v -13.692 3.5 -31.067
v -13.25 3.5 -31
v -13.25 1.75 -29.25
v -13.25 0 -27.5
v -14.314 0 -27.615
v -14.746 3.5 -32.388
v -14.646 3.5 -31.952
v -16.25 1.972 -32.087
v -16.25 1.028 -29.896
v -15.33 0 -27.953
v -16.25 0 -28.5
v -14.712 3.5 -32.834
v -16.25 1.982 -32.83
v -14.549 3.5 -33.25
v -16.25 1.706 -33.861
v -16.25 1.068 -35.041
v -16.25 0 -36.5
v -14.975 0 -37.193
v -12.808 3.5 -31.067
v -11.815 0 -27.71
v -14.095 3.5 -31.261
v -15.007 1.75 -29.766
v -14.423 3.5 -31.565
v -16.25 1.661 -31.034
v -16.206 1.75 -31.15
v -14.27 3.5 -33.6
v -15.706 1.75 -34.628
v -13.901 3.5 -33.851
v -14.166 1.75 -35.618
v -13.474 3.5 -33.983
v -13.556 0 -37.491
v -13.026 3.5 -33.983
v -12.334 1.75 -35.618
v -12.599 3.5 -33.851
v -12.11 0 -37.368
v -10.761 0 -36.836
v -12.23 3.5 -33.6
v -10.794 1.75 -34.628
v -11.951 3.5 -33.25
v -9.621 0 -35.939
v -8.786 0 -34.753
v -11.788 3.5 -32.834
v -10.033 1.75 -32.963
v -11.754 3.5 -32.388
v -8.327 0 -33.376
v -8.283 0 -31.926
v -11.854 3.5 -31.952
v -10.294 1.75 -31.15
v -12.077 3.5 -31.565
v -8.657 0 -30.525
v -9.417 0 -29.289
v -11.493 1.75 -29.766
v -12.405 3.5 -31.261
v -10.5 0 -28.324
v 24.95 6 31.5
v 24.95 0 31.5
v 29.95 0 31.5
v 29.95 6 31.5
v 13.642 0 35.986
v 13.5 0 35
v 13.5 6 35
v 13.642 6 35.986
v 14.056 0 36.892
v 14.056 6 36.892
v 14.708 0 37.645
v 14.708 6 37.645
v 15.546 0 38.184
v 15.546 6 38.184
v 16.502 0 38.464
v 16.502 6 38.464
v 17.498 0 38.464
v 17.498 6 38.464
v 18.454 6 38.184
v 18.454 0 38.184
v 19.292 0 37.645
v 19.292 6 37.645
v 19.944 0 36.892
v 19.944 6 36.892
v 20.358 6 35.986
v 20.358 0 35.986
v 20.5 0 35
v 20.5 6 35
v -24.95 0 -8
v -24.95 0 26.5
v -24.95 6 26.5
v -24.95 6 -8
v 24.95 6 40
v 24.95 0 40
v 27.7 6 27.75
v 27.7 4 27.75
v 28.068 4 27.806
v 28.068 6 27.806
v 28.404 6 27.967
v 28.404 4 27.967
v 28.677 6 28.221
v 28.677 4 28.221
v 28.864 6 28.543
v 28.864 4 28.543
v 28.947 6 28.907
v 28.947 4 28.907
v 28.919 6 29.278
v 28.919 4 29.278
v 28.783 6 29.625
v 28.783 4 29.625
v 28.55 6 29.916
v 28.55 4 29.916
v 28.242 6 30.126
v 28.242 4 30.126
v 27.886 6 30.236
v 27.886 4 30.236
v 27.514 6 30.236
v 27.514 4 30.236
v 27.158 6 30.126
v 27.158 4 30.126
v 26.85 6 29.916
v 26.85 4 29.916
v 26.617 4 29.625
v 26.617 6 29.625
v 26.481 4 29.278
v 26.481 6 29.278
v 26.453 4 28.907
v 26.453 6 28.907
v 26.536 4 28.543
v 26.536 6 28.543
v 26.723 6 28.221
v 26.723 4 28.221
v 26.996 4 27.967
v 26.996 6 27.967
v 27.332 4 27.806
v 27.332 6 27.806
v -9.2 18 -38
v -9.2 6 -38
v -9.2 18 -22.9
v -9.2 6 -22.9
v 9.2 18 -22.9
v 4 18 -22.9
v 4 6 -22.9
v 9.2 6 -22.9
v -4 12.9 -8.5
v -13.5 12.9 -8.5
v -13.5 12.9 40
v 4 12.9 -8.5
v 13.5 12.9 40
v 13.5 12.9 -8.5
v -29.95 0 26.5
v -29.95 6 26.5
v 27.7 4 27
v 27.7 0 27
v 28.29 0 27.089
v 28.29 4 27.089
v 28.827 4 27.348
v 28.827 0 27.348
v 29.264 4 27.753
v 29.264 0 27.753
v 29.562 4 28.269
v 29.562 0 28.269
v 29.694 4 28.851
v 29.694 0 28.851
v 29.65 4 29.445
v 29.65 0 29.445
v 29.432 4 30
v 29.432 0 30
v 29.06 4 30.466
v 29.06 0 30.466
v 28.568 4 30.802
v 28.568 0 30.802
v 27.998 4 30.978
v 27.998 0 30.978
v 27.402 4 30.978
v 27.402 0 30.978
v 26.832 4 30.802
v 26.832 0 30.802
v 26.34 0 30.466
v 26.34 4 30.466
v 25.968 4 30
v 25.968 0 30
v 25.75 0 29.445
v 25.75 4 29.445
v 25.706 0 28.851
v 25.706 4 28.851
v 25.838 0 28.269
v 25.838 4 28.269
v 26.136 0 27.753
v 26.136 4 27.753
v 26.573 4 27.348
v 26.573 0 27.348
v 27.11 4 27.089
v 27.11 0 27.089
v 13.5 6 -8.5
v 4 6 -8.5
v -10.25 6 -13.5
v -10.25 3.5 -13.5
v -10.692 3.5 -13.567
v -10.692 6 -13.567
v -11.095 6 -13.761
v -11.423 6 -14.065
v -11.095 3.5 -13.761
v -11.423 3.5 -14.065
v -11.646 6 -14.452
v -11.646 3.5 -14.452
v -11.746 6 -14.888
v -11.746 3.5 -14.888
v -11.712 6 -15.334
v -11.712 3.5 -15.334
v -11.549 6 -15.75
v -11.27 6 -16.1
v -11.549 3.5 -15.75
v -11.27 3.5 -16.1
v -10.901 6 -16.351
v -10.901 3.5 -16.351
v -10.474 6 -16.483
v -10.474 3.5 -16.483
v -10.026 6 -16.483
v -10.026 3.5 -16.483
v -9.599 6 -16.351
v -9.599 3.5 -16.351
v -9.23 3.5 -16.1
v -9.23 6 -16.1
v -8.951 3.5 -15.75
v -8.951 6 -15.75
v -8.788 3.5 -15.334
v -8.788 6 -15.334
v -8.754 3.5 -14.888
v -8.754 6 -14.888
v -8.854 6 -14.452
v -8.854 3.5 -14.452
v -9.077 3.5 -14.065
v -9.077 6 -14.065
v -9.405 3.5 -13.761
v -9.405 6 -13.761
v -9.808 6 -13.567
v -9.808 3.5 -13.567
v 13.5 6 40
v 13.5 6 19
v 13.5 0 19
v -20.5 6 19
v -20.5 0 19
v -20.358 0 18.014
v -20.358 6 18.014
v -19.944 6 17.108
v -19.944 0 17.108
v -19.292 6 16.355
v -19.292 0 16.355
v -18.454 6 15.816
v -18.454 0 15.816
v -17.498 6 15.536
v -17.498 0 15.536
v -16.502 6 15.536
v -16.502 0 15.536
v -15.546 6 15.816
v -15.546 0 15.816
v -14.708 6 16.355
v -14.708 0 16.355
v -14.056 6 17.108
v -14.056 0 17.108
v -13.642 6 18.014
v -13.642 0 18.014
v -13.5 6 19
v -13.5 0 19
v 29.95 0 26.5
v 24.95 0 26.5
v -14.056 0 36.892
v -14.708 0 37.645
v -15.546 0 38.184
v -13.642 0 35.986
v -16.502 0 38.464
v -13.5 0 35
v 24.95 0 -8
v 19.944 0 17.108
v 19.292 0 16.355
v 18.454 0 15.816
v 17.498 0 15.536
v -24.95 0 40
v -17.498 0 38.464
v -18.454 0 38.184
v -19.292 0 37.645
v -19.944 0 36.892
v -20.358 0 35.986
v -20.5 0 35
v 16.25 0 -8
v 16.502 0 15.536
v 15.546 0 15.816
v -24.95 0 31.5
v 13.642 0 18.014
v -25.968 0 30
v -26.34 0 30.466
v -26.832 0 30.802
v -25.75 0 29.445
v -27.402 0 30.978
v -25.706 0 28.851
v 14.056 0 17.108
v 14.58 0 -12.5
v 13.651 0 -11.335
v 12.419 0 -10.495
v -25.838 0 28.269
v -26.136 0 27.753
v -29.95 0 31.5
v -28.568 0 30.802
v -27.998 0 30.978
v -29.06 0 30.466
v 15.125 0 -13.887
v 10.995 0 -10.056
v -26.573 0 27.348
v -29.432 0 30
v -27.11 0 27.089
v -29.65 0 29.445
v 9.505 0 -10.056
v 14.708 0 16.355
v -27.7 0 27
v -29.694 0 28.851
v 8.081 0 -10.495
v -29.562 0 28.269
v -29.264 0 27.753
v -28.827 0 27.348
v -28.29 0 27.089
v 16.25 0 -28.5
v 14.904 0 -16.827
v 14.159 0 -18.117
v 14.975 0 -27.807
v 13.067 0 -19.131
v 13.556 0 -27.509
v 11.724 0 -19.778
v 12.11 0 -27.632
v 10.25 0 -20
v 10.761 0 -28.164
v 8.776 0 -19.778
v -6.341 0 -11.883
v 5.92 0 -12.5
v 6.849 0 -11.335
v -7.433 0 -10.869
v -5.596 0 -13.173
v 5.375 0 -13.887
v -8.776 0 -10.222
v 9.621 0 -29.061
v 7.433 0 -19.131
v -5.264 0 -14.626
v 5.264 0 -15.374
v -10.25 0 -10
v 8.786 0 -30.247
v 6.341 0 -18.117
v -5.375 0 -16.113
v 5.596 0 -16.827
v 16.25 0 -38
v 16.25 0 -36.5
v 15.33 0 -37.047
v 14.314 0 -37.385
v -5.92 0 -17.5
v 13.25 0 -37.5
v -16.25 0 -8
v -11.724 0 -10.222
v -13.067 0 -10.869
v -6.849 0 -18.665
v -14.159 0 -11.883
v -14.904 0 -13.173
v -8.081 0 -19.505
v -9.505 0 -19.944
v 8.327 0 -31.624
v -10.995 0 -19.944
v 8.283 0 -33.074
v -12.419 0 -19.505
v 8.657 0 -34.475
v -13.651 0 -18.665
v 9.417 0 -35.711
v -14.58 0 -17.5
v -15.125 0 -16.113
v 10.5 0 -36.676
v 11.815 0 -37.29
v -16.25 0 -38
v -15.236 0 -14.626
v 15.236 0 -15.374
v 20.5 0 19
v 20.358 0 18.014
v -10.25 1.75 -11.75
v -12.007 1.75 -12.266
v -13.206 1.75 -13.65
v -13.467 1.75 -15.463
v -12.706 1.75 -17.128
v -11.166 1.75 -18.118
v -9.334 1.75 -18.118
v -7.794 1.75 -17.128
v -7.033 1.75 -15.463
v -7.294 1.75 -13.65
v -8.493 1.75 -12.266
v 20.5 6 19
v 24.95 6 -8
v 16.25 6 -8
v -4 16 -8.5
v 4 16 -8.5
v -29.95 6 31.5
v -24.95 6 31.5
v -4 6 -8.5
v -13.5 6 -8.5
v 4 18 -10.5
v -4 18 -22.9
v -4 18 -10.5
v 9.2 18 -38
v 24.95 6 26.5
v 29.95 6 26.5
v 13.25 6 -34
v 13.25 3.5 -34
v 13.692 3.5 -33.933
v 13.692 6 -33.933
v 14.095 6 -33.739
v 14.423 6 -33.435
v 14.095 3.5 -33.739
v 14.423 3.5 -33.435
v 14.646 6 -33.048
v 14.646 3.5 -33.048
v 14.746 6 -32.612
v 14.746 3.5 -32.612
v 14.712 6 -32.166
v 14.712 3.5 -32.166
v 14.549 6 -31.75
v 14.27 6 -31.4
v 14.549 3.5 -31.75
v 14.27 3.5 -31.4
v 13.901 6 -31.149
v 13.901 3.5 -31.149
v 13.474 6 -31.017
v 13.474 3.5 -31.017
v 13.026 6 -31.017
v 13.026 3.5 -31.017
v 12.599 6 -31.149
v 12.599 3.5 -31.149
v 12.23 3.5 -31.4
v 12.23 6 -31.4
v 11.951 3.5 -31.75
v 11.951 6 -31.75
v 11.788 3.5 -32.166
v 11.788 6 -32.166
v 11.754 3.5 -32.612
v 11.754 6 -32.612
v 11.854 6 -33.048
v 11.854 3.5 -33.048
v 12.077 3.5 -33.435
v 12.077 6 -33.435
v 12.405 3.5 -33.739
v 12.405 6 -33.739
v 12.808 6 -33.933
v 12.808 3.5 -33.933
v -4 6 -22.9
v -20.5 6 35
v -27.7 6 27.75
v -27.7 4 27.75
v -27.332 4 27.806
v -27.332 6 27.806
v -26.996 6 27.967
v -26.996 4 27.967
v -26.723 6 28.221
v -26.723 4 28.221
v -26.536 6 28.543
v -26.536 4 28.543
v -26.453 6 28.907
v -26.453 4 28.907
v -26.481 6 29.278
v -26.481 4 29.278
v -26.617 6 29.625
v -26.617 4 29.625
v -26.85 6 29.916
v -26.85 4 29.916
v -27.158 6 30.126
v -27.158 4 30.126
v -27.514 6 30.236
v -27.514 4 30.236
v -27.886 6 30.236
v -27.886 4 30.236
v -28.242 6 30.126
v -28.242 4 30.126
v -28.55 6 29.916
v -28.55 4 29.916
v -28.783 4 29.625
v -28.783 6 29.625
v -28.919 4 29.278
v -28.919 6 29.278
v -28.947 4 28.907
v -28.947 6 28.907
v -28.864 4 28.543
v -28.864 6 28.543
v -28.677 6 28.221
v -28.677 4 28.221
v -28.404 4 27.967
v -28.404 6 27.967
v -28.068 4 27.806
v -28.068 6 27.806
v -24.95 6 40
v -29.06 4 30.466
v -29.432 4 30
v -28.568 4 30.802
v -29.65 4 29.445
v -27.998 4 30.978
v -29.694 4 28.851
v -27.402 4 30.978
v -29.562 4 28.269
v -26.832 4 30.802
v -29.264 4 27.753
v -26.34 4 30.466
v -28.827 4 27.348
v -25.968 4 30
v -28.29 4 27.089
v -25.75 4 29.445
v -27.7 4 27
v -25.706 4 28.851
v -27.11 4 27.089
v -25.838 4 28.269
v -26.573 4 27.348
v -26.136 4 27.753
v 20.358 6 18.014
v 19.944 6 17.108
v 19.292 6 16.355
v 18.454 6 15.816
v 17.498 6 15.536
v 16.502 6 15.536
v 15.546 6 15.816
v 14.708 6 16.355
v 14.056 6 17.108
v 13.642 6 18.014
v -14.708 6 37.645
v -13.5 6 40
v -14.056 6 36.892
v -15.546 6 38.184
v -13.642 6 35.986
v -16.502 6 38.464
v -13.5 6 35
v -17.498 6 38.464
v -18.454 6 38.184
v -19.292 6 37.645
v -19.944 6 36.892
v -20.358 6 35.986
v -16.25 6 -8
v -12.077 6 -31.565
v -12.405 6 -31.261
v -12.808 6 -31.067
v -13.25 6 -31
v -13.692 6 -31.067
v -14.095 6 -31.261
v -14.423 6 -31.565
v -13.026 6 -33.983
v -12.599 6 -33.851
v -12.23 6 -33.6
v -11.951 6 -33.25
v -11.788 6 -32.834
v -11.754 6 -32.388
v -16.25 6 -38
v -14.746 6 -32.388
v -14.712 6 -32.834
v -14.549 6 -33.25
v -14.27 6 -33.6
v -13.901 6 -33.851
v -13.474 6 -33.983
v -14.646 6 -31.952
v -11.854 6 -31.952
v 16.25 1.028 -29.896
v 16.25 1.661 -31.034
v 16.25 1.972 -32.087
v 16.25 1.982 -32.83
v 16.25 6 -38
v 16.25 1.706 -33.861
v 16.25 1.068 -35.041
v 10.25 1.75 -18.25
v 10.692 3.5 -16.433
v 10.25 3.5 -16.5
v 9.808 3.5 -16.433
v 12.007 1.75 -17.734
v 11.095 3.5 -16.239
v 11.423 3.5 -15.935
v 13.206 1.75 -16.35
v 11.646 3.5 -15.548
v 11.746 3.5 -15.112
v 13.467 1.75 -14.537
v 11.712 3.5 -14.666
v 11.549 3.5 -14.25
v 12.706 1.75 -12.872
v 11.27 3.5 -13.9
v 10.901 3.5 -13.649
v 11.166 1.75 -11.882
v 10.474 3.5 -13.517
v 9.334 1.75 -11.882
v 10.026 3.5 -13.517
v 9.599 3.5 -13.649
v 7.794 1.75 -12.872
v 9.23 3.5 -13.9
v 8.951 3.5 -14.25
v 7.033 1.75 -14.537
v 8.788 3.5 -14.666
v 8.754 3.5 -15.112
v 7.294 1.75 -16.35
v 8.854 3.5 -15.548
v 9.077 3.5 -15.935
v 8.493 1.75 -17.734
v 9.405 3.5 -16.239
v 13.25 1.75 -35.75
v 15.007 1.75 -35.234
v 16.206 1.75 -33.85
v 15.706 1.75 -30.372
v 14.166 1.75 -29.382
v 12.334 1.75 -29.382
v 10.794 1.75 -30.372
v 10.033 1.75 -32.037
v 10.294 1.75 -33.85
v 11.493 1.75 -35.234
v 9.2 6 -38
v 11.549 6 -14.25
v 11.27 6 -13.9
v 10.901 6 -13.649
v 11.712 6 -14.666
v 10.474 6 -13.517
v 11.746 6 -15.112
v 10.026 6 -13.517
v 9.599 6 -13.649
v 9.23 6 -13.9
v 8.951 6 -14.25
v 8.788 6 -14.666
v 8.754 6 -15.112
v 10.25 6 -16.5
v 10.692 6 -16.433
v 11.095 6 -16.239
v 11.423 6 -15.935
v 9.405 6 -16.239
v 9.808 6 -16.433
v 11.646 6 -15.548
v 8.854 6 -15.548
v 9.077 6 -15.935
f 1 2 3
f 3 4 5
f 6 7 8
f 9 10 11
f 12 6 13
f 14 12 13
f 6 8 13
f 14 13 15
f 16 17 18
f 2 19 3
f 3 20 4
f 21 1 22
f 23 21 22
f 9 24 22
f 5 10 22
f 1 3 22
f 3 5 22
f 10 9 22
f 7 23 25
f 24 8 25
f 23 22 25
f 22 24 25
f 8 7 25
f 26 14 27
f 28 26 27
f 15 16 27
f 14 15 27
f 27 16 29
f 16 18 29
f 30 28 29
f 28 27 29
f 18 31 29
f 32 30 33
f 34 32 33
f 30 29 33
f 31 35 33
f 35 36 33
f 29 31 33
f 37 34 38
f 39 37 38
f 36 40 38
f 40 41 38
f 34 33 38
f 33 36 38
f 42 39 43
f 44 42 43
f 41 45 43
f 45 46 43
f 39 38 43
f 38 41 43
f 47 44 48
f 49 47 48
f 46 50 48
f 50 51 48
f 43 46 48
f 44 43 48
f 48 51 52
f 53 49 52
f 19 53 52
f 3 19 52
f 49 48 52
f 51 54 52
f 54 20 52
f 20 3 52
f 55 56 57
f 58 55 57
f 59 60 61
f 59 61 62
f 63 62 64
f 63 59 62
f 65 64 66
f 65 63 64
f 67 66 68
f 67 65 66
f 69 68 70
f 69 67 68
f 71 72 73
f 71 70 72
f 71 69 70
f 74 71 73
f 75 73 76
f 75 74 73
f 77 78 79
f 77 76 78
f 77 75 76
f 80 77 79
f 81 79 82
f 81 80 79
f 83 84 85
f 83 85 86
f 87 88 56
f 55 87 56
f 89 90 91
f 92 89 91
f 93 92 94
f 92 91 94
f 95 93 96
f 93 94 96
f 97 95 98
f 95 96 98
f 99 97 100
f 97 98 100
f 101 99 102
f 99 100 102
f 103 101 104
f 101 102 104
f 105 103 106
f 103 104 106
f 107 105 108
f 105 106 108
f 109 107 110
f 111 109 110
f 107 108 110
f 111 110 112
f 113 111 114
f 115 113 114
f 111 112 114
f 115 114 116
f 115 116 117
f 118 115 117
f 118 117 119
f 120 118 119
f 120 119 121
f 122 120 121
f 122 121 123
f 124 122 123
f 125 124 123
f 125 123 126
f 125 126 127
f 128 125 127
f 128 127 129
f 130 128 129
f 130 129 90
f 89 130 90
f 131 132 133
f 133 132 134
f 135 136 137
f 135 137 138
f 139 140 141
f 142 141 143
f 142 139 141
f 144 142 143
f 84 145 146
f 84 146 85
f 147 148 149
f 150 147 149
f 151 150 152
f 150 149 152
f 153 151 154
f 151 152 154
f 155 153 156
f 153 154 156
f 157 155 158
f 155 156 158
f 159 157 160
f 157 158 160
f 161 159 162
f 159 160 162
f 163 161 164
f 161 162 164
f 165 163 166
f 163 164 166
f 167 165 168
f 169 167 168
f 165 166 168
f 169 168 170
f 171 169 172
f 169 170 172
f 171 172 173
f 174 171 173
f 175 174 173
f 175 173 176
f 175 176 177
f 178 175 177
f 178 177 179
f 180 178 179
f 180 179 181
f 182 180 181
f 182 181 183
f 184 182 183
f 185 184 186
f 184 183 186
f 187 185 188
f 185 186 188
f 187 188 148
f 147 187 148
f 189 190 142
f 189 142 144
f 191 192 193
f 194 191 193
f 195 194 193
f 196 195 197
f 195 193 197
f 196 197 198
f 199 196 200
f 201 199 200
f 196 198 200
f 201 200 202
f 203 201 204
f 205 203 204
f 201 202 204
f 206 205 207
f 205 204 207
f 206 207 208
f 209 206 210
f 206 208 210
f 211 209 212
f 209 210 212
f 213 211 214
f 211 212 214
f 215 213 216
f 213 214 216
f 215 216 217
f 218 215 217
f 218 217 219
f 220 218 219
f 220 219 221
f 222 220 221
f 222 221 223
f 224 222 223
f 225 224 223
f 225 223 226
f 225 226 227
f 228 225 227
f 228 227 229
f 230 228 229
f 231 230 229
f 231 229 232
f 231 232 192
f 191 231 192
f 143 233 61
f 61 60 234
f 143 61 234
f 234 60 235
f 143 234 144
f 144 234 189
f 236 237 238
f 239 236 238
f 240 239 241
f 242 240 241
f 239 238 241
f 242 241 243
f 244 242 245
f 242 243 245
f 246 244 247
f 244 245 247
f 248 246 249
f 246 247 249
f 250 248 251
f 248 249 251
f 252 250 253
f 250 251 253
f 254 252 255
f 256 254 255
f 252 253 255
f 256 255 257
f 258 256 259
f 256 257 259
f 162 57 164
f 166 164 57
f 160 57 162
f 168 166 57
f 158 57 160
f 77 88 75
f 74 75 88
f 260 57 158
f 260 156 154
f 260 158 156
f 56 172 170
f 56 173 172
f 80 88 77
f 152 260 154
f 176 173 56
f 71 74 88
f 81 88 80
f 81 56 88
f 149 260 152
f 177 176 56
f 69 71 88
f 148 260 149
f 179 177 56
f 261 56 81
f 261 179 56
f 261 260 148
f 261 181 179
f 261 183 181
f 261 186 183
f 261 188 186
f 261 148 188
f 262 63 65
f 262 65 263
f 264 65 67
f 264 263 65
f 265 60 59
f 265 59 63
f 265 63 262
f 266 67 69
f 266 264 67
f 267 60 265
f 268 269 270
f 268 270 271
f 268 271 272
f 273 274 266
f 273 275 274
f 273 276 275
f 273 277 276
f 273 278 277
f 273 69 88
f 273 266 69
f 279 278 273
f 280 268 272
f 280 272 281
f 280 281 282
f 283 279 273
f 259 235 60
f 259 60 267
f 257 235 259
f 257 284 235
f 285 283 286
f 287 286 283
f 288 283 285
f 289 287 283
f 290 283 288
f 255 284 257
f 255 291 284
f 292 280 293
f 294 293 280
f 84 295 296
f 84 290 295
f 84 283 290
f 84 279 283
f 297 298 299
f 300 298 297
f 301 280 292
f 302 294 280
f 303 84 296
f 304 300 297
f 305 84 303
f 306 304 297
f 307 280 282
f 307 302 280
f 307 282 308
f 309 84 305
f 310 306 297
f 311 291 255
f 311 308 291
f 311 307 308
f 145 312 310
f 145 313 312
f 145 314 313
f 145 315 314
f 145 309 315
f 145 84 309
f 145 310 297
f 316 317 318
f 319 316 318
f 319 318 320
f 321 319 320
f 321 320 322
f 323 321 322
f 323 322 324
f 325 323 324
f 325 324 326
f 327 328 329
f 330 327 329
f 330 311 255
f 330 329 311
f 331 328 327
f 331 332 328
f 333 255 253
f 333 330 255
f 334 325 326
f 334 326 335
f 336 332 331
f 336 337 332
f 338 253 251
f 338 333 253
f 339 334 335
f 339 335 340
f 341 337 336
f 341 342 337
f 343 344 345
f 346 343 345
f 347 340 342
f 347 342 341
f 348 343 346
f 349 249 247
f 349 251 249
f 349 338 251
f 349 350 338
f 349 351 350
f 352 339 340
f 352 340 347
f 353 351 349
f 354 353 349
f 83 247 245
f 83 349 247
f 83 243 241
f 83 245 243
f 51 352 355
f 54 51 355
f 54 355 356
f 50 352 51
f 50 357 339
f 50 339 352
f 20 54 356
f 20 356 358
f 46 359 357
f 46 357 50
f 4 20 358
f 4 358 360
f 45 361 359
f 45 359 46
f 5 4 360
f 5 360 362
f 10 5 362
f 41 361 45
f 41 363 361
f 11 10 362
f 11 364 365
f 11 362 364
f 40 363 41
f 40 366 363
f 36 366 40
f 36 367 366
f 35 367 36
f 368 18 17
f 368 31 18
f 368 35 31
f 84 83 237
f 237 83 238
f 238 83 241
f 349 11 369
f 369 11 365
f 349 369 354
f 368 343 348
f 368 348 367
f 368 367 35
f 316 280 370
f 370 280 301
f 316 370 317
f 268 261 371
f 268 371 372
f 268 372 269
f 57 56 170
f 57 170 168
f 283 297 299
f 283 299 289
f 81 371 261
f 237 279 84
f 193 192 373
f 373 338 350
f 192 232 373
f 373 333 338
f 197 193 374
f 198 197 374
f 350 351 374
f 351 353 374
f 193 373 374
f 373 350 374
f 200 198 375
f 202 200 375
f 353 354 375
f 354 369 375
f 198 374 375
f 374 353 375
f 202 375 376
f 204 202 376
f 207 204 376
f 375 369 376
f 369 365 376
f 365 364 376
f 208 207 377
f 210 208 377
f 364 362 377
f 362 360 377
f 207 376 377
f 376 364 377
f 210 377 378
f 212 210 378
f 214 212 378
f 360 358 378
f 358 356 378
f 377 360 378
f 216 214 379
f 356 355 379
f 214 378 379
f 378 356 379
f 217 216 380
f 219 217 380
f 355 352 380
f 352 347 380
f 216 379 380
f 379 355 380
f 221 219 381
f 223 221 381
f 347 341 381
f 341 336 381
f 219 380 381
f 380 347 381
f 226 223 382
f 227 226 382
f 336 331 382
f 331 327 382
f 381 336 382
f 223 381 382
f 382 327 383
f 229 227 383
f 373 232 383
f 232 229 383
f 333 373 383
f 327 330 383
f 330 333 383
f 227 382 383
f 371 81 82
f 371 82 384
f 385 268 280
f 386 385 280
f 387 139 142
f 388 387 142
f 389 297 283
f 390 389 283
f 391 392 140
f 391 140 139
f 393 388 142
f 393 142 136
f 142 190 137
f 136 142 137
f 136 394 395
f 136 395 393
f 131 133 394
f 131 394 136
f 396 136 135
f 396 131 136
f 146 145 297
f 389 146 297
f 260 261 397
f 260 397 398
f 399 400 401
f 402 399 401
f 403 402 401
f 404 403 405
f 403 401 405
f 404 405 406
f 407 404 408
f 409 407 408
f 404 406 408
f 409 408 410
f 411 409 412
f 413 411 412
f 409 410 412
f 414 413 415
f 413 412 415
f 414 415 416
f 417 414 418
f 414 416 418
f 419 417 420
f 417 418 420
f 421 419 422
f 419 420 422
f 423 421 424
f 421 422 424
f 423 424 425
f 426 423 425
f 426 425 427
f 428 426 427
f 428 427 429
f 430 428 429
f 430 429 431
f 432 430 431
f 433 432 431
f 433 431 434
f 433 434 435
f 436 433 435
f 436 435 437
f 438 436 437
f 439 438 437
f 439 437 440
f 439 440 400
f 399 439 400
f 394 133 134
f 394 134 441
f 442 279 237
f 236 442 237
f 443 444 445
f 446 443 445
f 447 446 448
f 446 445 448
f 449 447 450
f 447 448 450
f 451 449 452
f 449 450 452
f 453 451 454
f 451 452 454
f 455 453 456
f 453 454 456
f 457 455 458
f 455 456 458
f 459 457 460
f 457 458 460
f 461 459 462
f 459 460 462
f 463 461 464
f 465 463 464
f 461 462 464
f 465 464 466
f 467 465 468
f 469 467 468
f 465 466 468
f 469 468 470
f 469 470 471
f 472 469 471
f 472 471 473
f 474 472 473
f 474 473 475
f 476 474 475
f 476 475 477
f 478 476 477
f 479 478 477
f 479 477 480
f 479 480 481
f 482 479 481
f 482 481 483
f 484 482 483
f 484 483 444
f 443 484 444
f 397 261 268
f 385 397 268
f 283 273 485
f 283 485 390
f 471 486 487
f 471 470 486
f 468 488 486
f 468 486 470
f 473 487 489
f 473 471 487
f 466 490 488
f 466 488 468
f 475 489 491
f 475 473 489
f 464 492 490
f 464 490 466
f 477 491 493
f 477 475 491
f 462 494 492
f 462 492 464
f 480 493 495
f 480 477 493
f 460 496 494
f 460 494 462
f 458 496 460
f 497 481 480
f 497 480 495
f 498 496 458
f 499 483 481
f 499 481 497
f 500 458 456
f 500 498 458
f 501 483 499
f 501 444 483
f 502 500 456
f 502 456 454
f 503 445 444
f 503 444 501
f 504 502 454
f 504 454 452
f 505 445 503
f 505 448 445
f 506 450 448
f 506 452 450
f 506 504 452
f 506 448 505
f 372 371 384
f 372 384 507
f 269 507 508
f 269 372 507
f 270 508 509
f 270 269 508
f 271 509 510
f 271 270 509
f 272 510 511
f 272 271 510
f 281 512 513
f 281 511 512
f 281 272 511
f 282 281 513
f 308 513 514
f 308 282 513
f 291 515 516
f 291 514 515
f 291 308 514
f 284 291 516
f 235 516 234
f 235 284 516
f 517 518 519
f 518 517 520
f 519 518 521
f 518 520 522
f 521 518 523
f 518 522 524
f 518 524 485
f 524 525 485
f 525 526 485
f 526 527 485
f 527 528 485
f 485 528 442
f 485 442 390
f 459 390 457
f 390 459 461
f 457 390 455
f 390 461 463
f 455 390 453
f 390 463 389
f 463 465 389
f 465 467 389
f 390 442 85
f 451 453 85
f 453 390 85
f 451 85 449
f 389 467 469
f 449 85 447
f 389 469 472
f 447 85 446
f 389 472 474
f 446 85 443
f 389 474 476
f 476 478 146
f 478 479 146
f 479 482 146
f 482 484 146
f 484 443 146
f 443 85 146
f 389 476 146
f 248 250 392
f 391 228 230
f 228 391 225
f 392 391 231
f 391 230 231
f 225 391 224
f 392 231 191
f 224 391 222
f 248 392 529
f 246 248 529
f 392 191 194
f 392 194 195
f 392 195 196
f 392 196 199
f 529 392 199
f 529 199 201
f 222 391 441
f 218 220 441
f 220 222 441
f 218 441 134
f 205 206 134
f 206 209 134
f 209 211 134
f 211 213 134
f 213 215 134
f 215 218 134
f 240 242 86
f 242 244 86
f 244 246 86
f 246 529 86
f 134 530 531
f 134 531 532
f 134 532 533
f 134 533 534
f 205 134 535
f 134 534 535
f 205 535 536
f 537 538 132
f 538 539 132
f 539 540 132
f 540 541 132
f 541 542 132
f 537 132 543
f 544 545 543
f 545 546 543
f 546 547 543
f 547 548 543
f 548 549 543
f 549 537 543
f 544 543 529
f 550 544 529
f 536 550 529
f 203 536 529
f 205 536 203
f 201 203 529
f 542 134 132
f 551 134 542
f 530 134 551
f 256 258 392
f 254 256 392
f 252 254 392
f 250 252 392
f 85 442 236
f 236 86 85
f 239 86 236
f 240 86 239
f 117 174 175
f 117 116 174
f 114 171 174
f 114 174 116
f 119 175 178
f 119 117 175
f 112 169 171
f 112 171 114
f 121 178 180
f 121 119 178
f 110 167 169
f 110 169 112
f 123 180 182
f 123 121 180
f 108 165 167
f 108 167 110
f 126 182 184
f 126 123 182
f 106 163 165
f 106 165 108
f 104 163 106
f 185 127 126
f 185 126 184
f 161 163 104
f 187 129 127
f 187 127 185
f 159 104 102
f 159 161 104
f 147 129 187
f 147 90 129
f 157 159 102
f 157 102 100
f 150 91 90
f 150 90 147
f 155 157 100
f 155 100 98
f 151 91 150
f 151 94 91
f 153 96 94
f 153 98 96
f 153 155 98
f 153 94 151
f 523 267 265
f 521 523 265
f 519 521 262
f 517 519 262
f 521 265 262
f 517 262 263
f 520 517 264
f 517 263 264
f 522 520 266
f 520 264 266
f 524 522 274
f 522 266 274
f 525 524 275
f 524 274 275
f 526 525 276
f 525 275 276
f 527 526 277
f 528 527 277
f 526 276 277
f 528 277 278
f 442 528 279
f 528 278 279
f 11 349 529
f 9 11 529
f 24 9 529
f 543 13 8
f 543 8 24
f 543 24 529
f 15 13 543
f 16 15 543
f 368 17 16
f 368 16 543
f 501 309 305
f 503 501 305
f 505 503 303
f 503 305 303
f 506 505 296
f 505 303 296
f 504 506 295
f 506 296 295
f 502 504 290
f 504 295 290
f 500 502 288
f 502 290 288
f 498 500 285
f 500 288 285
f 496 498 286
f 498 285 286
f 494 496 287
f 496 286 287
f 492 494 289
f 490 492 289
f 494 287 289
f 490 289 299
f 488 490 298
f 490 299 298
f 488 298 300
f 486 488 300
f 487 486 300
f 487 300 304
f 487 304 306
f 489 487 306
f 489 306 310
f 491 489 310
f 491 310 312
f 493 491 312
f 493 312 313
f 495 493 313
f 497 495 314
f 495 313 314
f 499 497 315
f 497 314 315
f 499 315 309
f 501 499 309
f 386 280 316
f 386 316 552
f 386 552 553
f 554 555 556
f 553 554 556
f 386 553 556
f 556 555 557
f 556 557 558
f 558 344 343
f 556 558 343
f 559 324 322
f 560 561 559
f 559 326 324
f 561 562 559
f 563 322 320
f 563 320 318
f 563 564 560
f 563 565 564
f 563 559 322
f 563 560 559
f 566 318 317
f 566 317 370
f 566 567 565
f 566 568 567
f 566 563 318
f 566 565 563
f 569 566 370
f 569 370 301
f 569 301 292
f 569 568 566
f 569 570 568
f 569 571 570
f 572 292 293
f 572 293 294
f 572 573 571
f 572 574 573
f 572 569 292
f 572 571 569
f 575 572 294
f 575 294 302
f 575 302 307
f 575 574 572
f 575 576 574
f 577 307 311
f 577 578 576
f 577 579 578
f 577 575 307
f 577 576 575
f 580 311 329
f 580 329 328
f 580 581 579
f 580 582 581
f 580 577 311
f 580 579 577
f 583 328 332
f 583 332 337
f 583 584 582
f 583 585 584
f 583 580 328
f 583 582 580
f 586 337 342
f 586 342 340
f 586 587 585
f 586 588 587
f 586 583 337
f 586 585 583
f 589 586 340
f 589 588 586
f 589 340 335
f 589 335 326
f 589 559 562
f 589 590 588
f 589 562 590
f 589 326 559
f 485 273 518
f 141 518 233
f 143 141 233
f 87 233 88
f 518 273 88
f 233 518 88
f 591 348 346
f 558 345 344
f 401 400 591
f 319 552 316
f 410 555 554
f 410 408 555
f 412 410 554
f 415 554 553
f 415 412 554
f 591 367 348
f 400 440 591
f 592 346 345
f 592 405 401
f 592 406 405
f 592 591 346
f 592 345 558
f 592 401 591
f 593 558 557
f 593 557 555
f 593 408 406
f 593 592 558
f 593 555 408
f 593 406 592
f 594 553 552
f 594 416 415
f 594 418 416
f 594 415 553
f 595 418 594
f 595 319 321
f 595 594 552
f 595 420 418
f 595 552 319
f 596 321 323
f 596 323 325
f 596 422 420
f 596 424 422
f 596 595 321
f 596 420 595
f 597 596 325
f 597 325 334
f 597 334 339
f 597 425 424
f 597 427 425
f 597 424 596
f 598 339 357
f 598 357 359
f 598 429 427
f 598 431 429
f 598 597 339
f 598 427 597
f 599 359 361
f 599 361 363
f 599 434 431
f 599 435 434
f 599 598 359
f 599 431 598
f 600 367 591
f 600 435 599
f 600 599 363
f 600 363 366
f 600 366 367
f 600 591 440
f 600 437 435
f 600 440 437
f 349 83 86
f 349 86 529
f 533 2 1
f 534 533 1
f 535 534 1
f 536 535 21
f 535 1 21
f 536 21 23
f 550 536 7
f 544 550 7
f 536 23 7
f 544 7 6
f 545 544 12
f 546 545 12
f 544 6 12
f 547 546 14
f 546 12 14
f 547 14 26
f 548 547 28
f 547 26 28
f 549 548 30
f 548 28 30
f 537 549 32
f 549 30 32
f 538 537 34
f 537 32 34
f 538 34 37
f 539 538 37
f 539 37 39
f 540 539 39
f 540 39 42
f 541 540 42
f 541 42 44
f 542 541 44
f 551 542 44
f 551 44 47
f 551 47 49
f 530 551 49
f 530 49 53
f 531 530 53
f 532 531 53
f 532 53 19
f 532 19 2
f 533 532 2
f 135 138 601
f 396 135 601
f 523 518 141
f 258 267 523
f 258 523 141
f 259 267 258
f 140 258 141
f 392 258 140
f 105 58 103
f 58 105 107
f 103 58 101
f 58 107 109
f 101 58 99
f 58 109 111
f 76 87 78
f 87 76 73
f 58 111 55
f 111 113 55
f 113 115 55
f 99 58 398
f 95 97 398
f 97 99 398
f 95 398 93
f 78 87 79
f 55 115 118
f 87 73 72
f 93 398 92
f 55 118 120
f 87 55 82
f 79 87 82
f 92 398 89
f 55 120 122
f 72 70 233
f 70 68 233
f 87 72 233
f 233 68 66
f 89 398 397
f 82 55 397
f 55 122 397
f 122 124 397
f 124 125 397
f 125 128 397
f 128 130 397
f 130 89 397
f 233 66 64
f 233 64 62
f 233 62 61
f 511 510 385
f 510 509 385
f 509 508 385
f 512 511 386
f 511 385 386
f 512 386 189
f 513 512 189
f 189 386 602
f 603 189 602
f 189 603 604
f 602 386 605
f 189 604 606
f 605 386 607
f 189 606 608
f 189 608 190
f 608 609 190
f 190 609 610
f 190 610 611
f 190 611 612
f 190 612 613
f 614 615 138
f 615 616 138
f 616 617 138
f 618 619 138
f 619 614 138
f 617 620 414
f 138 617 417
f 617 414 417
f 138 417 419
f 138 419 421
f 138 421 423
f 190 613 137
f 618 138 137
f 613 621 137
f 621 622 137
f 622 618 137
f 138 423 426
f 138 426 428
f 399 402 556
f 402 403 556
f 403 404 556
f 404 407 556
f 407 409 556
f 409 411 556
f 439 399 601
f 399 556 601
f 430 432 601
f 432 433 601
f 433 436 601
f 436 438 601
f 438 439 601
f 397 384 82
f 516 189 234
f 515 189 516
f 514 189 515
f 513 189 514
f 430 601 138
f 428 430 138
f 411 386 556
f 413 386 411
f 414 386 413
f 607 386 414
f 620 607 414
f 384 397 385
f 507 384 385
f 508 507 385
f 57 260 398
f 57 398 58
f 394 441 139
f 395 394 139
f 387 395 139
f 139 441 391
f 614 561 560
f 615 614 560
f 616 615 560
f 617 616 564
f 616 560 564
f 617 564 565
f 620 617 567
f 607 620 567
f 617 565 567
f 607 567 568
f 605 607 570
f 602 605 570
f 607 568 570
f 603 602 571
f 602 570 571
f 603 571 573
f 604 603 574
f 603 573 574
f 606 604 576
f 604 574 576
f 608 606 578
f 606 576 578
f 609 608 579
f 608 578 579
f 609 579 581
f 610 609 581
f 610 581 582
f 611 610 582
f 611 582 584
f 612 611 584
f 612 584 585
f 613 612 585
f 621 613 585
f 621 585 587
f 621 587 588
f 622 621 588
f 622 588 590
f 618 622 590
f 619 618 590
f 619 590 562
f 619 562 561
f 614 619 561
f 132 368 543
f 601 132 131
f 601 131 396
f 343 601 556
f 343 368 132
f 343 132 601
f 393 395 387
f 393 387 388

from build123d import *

# Parameters (mm, degrees)
EXTRUDE_1_DEPTH     = 6
EXTRUDE_2_DEPTH     = 12
CUT_EXTRUDE_1_REACH = 52.712
SKETCH_3_R          = 1.5
CHAMFER_1_SIZE      = 2
SKETCH_4_W          = 27
SKETCH_4_H          = 48.5
EXTRUDE_3_DEPTH     = 6.9
SKETCH_5_W          = 32.5
SKETCH_5_H          = 0.5
CUT_EXTRUDE_2_DEPTH = 51.711956184
SKETCH_6_W          = 5
SKETCH_6_H          = 5
EXTRUDE_4_DEPTH     = 6
SKETCH_9_R          = 1.25
CUT_EXTRUDE_5_DEPTH = 54.113110434
SKETCH_10_R         = 2
CUT_EXTRUDE_6_DEPTH = 4
CHAMFER_3_SIZE      = 3.5


with BuildPart() as part:
    # 草图1 → 凸台-拉伸1 (new body)
    with BuildSketch(Plane(origin=(0, 0, 0), x_dir=(1, 0, 0), z_dir=(0, 1, 0))):
        Polygon((-25.45, -32), (-25.45, -28), (-25.45, -3.5), (-25.45, 0.5), (-25.45, 8.5), (-16.25, 8.5), (-16.25, 38.5), (16.25, 38.5), (16.25, 8.5), (25.45, 8.5), (25.45, 0.5), (25.45, -3.5), (25.45, -28), (25.45, -32), (25.45, -40), (-25.45, -40), align=None)
    extrude(amount=EXTRUDE_1_DEPTH)

    # 草图2 → 凸台-拉伸2 (add)
    with BuildSketch(Plane(origin=(0, 6, 0), x_dir=(1, 0, 0), z_dir=(0, 1, 0))):
        Polygon((-4, 22.9), (-4, 8.5), (4, 8.5), (4, 22.9), (9.2, 22.9), (9.2, 38.5), (-9.2, 38.5), (-9.2, 22.9), align=None)
    extrude(amount=EXTRUDE_2_DEPTH)

    # 草图3 → 切除-拉伸1 (cut, up to next)
    with BuildSketch(Plane.XZ, mode=Mode.PRIVATE) as cut_extrude_1_sk1:
        with Locations(Location((13.25, -32.5, 0), (0, 0, 270))):
            Circle(SKETCH_3_R)
    cut_extrude_1_tool1 = extrude(cut_extrude_1_sk1.sketch, amount=-CUT_EXTRUDE_1_REACH, mode=Mode.PRIVATE) & part.part
    # 草图3 → 切除-拉伸1 (cut, up to next)
    with BuildSketch(Plane.XZ, mode=Mode.PRIVATE) as cut_extrude_1_sk2:
        with Locations(Location((10.25, -15, 0), (0, 0, 270))):
            Circle(SKETCH_3_R)
    cut_extrude_1_tool2 = extrude(cut_extrude_1_sk2.sketch, amount=-CUT_EXTRUDE_1_REACH, mode=Mode.PRIVATE) & part.part
    # 草图3 → 切除-拉伸1 (cut, up to next)
    with BuildSketch(Plane.XZ, mode=Mode.PRIVATE) as cut_extrude_1_sk3:
        with Locations(Location((-13.25, -32.5, 0), (0, 0, 90))):
            Circle(SKETCH_3_R)
    cut_extrude_1_tool3 = extrude(cut_extrude_1_sk3.sketch, amount=-CUT_EXTRUDE_1_REACH, mode=Mode.PRIVATE) & part.part
    # 草图3 → 切除-拉伸1 (cut, up to next)
    with BuildSketch(Plane.XZ, mode=Mode.PRIVATE) as cut_extrude_1_sk4:
        with Locations(Location((-10.25, -15, 0), (0, 0, 90))):
            Circle(SKETCH_3_R)
    cut_extrude_1_tool4 = extrude(cut_extrude_1_sk4.sketch, amount=-CUT_EXTRUDE_1_REACH, mode=Mode.PRIVATE) & part.part
    # 草图3 → 切除-拉伸1 (cut, up to next)
    with BuildSketch(Plane.XZ, mode=Mode.PRIVATE) as cut_extrude_1_sk5:
        with BuildLine():
            Line((13.5, 19), (13.5, 35))
            ThreePointArc((13.5, 35), (17, 38.5), (20.5, 35))
            Line((20.5, 35), (20.5, 19))
            ThreePointArc((20.5, 19), (17, 15.5), (13.5, 19))
        make_face()
    cut_extrude_1_tool5 = extrude(cut_extrude_1_sk5.sketch, amount=-CUT_EXTRUDE_1_REACH, mode=Mode.PRIVATE) & part.part
    # 草图3 → 切除-拉伸1 (cut, up to next)
    with BuildSketch(Plane.XZ, mode=Mode.PRIVATE) as cut_extrude_1_sk6:
        with BuildLine():
            Line((-13.5, 19), (-13.5, 35))
            ThreePointArc((-13.5, 35), (-17, 38.5), (-20.5, 35))
            Line((-20.5, 35), (-20.5, 19))
            ThreePointArc((-20.5, 19), (-17, 15.5), (-13.5, 19))
        make_face()
    cut_extrude_1_tool6 = extrude(cut_extrude_1_sk6.sketch, amount=-CUT_EXTRUDE_1_REACH, mode=Mode.PRIVATE) & part.part
    add(cut_extrude_1_tool1.solids().sort_by_distance((13.25, 0, -32.5))[0], mode=Mode.SUBTRACT)
    add(cut_extrude_1_tool2.solids().sort_by_distance((10.25, 0, -15))[0], mode=Mode.SUBTRACT)
    add(cut_extrude_1_tool3.solids().sort_by_distance((-13.25, 0, -32.5))[0], mode=Mode.SUBTRACT)
    add(cut_extrude_1_tool4.solids().sort_by_distance((-10.25, 0, -15))[0], mode=Mode.SUBTRACT)
    add(cut_extrude_1_tool5.solids().sort_by_distance((17, 0, 27))[0], mode=Mode.SUBTRACT)
    add(cut_extrude_1_tool6.solids().sort_by_distance((-17, 0, 27))[0], mode=Mode.SUBTRACT)

    # 倒角1
    chamfer_1_edges = [part.edges().sort_by_distance(p)[0] for p in [
        (0, 18, -8.5),
    ]]
    chamfer(chamfer_1_edges, length=CHAMFER_1_SIZE)

    # 草图4 → 凸台-拉伸3 (add)
    with BuildSketch(Plane(origin=(0, 6, 0), x_dir=(1, 0, 0), z_dir=(0, 1, 0))):
        with Locations((0, -15.75)):
            Rectangle(SKETCH_4_W, SKETCH_4_H)
    extrude(amount=EXTRUDE_3_DEPTH)

    # 草图5 → 切除-拉伸2 (cut, through all)
    with BuildSketch(Plane.XZ):
        Polygon((24.95, 40), (24.95, -8), (16.25, -8), (16.25, -8.5), (25.45, -8.5), (25.45, 40), align=None)
        Polygon((-16.25, -8.5), (-25.45, -8.5), (-25.45, 40), (-24.95, 40), (-24.95, -8), (-16.25, -8), align=None)
        with Locations((0, -38.25)):
            Rectangle(SKETCH_5_W, SKETCH_5_H)
    extrude(amount=-CUT_EXTRUDE_2_DEPTH, mode=Mode.SUBTRACT)

    # 草图6 → 凸台-拉伸4 (add)
    with BuildSketch(Plane.XZ):
        with Locations((-27.45, 29)):
            Rectangle(SKETCH_6_W, SKETCH_6_H)
        with Locations((27.45, 29)):
            Rectangle(SKETCH_6_W, SKETCH_6_H)
    extrude(amount=-EXTRUDE_4_DEPTH)

    # 草图9 → 切除-拉伸5 (cut, through all)
    with BuildSketch(Plane.XZ):
        with Locations(Location((-27.7, 29, 0), (0, 0, 270))):
            Circle(SKETCH_9_R)
        with Locations(Location((27.7, 29, 0), (0, 0, 270))):
            Circle(SKETCH_9_R)
    extrude(amount=-CUT_EXTRUDE_5_DEPTH, mode=Mode.SUBTRACT)

    # 草图10 → 切除-拉伸6 (cut)
    with BuildSketch(Plane.XZ):
        with Locations(Location((27.7, 29, 0), (0, 0, 270))):
            Circle(SKETCH_10_R)
        with Locations(Location((-27.7, 29, 0), (0, 0, 270))):
            Circle(SKETCH_10_R)
    extrude(amount=-CUT_EXTRUDE_6_DEPTH, mode=Mode.SUBTRACT)

    # 倒角3
    # the kernel refuses this chamfer: 3.5 mm, written as the material it takes off along each edge
    with BuildSketch(Plane(origin=(10.25, 0, -15), x_dir=(0, 0, -1), z_dir=(-1, 0, 0))) as chamfer_3_piece_1:
        Polygon((1.5 + CHAMFER_3_SIZE, 0), (1.5, -CHAMFER_3_SIZE), (1.5, 0), align=None)
    revolve(axis=Axis((10.25, 0, -15), (0, -1, 0)), mode=Mode.SUBTRACT)
    with BuildSketch(Plane(origin=(-13.25, 0, -32.5), x_dir=(0, 0, 1), z_dir=(1, 0, 0))) as chamfer_3_piece_2:
        Polygon((1.5, -CHAMFER_3_SIZE), (1.5 + CHAMFER_3_SIZE, 0), (1.5, 0), align=None)
    revolve(axis=Axis((-13.25, 0, -32.5), (0, -1, 0)), mode=Mode.SUBTRACT)
    with BuildSketch(Plane(origin=(13.25, 0, -32.5), x_dir=(0, 0, -1), z_dir=(-1, 0, 0))) as chamfer_3_piece_3:
        Polygon((1.5 + CHAMFER_3_SIZE, 0), (1.5, -CHAMFER_3_SIZE), (1.5, 0), align=None)
    revolve(axis=Axis((13.25, 0, -32.5), (0, -1, 0)), mode=Mode.SUBTRACT)
    with BuildSketch(Plane(origin=(-10.25, 0, -15), x_dir=(0, 0, 1), z_dir=(1, 0, 0))) as chamfer_3_piece_4:
        Polygon((1.5, -CHAMFER_3_SIZE), (1.5 + CHAMFER_3_SIZE, 0), (1.5, 0), align=None)
    revolve(axis=Axis((-10.25, 0, -15), (0, -1, 0)), mode=Mode.SUBTRACT)


solid = part.part
